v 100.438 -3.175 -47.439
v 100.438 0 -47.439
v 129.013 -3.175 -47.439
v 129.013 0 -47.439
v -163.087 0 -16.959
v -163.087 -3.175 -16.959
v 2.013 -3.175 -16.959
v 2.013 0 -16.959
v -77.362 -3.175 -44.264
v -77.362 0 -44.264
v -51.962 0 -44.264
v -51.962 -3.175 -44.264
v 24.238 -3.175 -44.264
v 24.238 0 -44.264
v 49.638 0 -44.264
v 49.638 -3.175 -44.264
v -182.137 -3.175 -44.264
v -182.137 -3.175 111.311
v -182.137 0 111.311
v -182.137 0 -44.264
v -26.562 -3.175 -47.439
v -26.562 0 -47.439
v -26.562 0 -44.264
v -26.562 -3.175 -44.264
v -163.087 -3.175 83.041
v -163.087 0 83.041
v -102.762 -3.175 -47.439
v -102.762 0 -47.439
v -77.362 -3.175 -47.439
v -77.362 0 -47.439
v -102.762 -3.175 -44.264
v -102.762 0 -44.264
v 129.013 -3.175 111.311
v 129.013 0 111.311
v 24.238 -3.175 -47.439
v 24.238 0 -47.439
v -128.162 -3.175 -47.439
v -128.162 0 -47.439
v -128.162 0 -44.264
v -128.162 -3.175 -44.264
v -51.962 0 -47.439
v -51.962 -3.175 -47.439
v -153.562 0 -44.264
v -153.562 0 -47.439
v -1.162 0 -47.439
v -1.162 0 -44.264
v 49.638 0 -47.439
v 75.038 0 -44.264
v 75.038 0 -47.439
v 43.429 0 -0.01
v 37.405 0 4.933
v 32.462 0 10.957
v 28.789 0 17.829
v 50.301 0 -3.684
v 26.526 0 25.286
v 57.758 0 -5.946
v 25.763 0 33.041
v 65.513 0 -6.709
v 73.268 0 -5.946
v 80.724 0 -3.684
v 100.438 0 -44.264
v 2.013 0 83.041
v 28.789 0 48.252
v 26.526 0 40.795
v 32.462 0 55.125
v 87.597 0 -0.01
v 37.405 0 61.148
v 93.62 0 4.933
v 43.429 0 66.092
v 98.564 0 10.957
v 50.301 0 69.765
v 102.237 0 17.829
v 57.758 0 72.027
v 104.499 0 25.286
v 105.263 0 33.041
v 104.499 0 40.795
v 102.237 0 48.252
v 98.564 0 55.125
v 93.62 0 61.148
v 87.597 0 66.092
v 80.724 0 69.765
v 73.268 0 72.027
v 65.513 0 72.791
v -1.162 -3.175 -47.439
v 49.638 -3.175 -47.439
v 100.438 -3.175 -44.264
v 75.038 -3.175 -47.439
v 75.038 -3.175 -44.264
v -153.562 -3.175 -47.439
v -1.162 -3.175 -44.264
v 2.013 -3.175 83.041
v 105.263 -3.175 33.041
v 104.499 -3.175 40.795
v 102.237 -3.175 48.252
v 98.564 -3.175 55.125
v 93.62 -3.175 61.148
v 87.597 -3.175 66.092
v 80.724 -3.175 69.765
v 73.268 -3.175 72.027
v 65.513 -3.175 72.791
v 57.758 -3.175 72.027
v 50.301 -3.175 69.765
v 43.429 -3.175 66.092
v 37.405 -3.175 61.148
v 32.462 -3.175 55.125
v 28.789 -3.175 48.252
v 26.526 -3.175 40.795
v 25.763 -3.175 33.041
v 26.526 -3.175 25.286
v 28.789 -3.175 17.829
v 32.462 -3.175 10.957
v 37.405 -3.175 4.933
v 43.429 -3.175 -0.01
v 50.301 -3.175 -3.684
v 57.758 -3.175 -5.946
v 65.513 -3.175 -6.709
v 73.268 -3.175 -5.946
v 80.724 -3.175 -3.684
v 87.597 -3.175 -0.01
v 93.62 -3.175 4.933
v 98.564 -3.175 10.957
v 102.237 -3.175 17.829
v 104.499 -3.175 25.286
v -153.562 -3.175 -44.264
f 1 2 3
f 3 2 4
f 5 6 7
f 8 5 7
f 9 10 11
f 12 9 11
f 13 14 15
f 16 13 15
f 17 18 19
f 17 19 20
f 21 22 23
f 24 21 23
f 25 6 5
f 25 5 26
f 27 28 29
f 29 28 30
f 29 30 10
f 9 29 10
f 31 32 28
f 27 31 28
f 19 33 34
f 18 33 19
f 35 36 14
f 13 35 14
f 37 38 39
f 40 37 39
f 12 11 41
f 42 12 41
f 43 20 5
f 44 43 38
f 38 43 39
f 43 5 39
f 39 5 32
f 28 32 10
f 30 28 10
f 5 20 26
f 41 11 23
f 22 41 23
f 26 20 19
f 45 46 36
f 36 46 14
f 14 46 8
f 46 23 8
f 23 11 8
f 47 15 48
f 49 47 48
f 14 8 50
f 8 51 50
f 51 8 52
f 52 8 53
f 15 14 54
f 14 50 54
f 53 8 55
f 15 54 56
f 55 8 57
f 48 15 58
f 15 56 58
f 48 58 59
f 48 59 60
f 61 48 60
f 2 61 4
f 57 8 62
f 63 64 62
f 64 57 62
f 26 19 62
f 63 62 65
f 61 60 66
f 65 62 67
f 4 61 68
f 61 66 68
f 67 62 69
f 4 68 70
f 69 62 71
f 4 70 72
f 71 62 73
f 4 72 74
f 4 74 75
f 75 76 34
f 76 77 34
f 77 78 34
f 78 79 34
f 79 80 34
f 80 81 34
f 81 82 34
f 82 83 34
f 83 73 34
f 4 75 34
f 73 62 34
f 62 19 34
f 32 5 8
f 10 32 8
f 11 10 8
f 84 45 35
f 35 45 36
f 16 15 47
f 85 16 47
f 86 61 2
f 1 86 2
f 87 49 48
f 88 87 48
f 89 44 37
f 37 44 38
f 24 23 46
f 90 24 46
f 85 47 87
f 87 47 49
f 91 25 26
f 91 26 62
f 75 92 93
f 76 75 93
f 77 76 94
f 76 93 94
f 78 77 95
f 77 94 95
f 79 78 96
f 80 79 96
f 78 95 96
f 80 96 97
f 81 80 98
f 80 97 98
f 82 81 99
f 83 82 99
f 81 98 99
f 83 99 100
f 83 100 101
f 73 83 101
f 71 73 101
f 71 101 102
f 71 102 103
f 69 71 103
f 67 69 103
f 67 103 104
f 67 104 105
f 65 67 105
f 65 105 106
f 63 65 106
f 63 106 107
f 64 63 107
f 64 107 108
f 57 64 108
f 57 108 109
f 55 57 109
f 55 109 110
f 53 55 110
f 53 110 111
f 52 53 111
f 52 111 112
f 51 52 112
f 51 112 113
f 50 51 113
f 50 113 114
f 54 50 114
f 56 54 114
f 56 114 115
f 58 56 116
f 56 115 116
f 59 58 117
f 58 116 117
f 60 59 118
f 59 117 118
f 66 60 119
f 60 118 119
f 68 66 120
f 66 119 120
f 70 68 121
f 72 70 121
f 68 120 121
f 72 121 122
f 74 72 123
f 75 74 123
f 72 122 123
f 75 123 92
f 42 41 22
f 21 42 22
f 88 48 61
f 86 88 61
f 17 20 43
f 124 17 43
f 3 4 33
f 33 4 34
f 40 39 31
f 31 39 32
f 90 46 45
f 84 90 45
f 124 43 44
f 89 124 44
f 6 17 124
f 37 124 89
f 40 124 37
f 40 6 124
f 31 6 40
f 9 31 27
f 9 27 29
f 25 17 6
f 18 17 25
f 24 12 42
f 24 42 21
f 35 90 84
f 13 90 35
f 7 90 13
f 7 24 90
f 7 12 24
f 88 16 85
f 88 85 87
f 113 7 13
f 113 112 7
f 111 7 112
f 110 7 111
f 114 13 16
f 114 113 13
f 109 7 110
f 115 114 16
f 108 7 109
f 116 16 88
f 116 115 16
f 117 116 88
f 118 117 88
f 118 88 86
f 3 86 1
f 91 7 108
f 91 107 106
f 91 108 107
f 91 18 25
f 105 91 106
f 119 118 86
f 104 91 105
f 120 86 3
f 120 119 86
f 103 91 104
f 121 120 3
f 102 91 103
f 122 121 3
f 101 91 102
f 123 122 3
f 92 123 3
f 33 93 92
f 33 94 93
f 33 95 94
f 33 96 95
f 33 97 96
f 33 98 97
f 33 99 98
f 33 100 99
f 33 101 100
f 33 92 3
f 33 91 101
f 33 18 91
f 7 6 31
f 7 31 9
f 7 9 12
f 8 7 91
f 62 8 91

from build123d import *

# Parameters (mm, degrees)
F1_DEPTH = 3.175
F2_W     = 165.1
F2_H     = 100
F2_R     = 39.75
F3_DEPTH = 25.4
F4_W     = 3.175
F4_H     = 25.4
F4_H_2   = 28.575
F4_W_2   = 25.4
F4_H_3   = 3.175
F5_DEPTH = 3.175


# Not quite as in the source:
# - a length typed as a fraction of an inch, garbled in the dataset ("3 / 203.2 mm" for 3/8 in), is restored


with BuildPart() as f1:
    # F0 (on Front) → F1 (new body)
    with BuildSketch(Plane.XZ):
        Polygon((-178.9622853069, -44.2643848114), (-153.5622853069, -44.2643848114), (-153.5622853069, -47.4393848114), (-128.1622853069, -47.4393848114), (-128.1622853069, -44.2643848114), (-102.7622853069, -44.2643848114), (-102.7622853069, -47.4393848114), (-77.3622853069, -47.4393848114), (-77.3622853069, -44.2643848114), (-51.9622853069, -44.2643848114), (-51.9622853069, -47.4393848114), (-26.5622853069, -47.4393848114), (-26.5622853069, -44.2643848114), (-1.1622853069, -44.2643848114), (-1.1622853069, -47.4393848114), (24.2377146931, -47.4393848114), (24.2377146931, -44.2643848114), (49.6377146931, -44.2643848114), (49.6377146931, -47.4393848114), (75.0377146931, -47.4393848114), (75.0377146931, -44.2643848114), (100.4377146931, -44.2643848114), (100.4377146931, -47.4393848114), (125.8377146931, -47.4393848114), (129.0127146931, -47.4393848114), (129.0127146931, -44.2643848114), (129.0127146931, -18.8643848114), (125.8377146931, -18.8643848114), (125.8377146931, 6.5356151886), (129.0127146931, 6.5356151886), (129.0127146931, 31.9356151886), (125.8377146931, 31.9356151886), (125.8377146931, 57.3356151886), (129.0127146931, 57.3356151886), (129.0127146931, 82.7356151886), (125.8377146931, 82.7356151886), (125.8377146931, 108.1356151886), (125.8377146931, 111.3106151886), (100.4377146931, 111.3106151886), (100.4377146931, 108.1356151886), (75.0377146931, 108.1356151886), (75.0377146931, 111.3106151886), (49.6377146931, 111.3106151886), (49.6377146931, 108.1356151886), (24.2377146931, 108.1356151886), (24.2377146931, 111.3106151886), (-1.1622853069, 111.3106151886), (-1.1622853069, 108.1356151886), (-26.5622853069, 108.1356151886), (-26.5622853069, 111.3106151886), (-51.9622853069, 111.3106151886), (-51.9622853069, 108.1356151886), (-77.3622853069, 108.1356151886), (-77.3622853069, 111.3106151886), (-102.7622853069, 111.3106151886), (-102.7622853069, 108.1356151886), (-128.1622853069, 108.1356151886), (-128.1622853069, 111.3106151886), (-153.5622853069, 111.3106151886), (-153.5622853069, 108.1356151886), (-178.9622853069, 108.1356151886), (-178.9622853069, 82.7356151886), (-182.1372853069, 82.7356151886), (-182.1372853069, 57.3356151886), (-178.9622853069, 57.3356151886), (-178.9622853069, 31.9356151886), (-182.1372853069, 31.9356151886), (-182.1372853069, 6.5356151886), (-178.9622853069, 6.5356151886), (-178.9622853069, -18.8643848114), (-182.1372853069, -18.8643848114), (-182.1372853069, -44.2643848114), align=None)
    extrude(amount=F1_DEPTH)

    # F2 (on face) → F3 (cut)
    with BuildSketch(Plane.XZ.offset(3.175)):
        with Locations((-80.5372853069, 33.0406151886)):
            Rectangle(F2_W, F2_H)
        with Locations((65.5127146931, 33.0406151886)):
            Circle(F2_R)
    extrude(amount=-F3_DEPTH, mode=Mode.SUBTRACT)

    # F4 (on face) → F5 (join)
    with BuildSketch(Plane.XZ.offset(3.175)):
        Polygon((-182.1372853069, 111.3106151886), (-182.1372853069, 82.7356151886), (-178.9622853069, 82.7356151886), (-178.9622853069, 108.1356151886), (-153.5622853069, 108.1356151886), (-153.5622853069, 111.3106151886), align=None)
        with Locations((-180.5497853069, 44.6356151886)):
            Rectangle(F4_W, F4_H)
        with Locations((-180.5497853069, -6.1643848114)):
            Rectangle(F4_W, F4_H)
        with Locations((127.4252146931, -6.1643848114)):
            Rectangle(F4_W, F4_H)
        with Locations((127.4252146931, 44.6356151886)):
            Rectangle(F4_W, F4_H)
        with Locations((127.4252146931, 97.0231151886)):
            Rectangle(F4_W, F4_H_2)
        with Locations((87.7377146931, 109.7231151886)):
            Rectangle(F4_W_2, F4_H_3)
        with Locations((36.9377146931, 109.7231151886)):
            Rectangle(F4_W_2, F4_H_3)
        with Locations((-13.8622853069, 109.7231151886)):
            Rectangle(F4_W_2, F4_H_3)
        with Locations((-64.6622853069, 109.7231151886)):
            Rectangle(F4_W_2, F4_H_3)
        with Locations((-115.4622853069, 109.7231151886)):
            Rectangle(F4_W_2, F4_H_3)
    extrude(amount=-F5_DEPTH)


solid = f1.part
